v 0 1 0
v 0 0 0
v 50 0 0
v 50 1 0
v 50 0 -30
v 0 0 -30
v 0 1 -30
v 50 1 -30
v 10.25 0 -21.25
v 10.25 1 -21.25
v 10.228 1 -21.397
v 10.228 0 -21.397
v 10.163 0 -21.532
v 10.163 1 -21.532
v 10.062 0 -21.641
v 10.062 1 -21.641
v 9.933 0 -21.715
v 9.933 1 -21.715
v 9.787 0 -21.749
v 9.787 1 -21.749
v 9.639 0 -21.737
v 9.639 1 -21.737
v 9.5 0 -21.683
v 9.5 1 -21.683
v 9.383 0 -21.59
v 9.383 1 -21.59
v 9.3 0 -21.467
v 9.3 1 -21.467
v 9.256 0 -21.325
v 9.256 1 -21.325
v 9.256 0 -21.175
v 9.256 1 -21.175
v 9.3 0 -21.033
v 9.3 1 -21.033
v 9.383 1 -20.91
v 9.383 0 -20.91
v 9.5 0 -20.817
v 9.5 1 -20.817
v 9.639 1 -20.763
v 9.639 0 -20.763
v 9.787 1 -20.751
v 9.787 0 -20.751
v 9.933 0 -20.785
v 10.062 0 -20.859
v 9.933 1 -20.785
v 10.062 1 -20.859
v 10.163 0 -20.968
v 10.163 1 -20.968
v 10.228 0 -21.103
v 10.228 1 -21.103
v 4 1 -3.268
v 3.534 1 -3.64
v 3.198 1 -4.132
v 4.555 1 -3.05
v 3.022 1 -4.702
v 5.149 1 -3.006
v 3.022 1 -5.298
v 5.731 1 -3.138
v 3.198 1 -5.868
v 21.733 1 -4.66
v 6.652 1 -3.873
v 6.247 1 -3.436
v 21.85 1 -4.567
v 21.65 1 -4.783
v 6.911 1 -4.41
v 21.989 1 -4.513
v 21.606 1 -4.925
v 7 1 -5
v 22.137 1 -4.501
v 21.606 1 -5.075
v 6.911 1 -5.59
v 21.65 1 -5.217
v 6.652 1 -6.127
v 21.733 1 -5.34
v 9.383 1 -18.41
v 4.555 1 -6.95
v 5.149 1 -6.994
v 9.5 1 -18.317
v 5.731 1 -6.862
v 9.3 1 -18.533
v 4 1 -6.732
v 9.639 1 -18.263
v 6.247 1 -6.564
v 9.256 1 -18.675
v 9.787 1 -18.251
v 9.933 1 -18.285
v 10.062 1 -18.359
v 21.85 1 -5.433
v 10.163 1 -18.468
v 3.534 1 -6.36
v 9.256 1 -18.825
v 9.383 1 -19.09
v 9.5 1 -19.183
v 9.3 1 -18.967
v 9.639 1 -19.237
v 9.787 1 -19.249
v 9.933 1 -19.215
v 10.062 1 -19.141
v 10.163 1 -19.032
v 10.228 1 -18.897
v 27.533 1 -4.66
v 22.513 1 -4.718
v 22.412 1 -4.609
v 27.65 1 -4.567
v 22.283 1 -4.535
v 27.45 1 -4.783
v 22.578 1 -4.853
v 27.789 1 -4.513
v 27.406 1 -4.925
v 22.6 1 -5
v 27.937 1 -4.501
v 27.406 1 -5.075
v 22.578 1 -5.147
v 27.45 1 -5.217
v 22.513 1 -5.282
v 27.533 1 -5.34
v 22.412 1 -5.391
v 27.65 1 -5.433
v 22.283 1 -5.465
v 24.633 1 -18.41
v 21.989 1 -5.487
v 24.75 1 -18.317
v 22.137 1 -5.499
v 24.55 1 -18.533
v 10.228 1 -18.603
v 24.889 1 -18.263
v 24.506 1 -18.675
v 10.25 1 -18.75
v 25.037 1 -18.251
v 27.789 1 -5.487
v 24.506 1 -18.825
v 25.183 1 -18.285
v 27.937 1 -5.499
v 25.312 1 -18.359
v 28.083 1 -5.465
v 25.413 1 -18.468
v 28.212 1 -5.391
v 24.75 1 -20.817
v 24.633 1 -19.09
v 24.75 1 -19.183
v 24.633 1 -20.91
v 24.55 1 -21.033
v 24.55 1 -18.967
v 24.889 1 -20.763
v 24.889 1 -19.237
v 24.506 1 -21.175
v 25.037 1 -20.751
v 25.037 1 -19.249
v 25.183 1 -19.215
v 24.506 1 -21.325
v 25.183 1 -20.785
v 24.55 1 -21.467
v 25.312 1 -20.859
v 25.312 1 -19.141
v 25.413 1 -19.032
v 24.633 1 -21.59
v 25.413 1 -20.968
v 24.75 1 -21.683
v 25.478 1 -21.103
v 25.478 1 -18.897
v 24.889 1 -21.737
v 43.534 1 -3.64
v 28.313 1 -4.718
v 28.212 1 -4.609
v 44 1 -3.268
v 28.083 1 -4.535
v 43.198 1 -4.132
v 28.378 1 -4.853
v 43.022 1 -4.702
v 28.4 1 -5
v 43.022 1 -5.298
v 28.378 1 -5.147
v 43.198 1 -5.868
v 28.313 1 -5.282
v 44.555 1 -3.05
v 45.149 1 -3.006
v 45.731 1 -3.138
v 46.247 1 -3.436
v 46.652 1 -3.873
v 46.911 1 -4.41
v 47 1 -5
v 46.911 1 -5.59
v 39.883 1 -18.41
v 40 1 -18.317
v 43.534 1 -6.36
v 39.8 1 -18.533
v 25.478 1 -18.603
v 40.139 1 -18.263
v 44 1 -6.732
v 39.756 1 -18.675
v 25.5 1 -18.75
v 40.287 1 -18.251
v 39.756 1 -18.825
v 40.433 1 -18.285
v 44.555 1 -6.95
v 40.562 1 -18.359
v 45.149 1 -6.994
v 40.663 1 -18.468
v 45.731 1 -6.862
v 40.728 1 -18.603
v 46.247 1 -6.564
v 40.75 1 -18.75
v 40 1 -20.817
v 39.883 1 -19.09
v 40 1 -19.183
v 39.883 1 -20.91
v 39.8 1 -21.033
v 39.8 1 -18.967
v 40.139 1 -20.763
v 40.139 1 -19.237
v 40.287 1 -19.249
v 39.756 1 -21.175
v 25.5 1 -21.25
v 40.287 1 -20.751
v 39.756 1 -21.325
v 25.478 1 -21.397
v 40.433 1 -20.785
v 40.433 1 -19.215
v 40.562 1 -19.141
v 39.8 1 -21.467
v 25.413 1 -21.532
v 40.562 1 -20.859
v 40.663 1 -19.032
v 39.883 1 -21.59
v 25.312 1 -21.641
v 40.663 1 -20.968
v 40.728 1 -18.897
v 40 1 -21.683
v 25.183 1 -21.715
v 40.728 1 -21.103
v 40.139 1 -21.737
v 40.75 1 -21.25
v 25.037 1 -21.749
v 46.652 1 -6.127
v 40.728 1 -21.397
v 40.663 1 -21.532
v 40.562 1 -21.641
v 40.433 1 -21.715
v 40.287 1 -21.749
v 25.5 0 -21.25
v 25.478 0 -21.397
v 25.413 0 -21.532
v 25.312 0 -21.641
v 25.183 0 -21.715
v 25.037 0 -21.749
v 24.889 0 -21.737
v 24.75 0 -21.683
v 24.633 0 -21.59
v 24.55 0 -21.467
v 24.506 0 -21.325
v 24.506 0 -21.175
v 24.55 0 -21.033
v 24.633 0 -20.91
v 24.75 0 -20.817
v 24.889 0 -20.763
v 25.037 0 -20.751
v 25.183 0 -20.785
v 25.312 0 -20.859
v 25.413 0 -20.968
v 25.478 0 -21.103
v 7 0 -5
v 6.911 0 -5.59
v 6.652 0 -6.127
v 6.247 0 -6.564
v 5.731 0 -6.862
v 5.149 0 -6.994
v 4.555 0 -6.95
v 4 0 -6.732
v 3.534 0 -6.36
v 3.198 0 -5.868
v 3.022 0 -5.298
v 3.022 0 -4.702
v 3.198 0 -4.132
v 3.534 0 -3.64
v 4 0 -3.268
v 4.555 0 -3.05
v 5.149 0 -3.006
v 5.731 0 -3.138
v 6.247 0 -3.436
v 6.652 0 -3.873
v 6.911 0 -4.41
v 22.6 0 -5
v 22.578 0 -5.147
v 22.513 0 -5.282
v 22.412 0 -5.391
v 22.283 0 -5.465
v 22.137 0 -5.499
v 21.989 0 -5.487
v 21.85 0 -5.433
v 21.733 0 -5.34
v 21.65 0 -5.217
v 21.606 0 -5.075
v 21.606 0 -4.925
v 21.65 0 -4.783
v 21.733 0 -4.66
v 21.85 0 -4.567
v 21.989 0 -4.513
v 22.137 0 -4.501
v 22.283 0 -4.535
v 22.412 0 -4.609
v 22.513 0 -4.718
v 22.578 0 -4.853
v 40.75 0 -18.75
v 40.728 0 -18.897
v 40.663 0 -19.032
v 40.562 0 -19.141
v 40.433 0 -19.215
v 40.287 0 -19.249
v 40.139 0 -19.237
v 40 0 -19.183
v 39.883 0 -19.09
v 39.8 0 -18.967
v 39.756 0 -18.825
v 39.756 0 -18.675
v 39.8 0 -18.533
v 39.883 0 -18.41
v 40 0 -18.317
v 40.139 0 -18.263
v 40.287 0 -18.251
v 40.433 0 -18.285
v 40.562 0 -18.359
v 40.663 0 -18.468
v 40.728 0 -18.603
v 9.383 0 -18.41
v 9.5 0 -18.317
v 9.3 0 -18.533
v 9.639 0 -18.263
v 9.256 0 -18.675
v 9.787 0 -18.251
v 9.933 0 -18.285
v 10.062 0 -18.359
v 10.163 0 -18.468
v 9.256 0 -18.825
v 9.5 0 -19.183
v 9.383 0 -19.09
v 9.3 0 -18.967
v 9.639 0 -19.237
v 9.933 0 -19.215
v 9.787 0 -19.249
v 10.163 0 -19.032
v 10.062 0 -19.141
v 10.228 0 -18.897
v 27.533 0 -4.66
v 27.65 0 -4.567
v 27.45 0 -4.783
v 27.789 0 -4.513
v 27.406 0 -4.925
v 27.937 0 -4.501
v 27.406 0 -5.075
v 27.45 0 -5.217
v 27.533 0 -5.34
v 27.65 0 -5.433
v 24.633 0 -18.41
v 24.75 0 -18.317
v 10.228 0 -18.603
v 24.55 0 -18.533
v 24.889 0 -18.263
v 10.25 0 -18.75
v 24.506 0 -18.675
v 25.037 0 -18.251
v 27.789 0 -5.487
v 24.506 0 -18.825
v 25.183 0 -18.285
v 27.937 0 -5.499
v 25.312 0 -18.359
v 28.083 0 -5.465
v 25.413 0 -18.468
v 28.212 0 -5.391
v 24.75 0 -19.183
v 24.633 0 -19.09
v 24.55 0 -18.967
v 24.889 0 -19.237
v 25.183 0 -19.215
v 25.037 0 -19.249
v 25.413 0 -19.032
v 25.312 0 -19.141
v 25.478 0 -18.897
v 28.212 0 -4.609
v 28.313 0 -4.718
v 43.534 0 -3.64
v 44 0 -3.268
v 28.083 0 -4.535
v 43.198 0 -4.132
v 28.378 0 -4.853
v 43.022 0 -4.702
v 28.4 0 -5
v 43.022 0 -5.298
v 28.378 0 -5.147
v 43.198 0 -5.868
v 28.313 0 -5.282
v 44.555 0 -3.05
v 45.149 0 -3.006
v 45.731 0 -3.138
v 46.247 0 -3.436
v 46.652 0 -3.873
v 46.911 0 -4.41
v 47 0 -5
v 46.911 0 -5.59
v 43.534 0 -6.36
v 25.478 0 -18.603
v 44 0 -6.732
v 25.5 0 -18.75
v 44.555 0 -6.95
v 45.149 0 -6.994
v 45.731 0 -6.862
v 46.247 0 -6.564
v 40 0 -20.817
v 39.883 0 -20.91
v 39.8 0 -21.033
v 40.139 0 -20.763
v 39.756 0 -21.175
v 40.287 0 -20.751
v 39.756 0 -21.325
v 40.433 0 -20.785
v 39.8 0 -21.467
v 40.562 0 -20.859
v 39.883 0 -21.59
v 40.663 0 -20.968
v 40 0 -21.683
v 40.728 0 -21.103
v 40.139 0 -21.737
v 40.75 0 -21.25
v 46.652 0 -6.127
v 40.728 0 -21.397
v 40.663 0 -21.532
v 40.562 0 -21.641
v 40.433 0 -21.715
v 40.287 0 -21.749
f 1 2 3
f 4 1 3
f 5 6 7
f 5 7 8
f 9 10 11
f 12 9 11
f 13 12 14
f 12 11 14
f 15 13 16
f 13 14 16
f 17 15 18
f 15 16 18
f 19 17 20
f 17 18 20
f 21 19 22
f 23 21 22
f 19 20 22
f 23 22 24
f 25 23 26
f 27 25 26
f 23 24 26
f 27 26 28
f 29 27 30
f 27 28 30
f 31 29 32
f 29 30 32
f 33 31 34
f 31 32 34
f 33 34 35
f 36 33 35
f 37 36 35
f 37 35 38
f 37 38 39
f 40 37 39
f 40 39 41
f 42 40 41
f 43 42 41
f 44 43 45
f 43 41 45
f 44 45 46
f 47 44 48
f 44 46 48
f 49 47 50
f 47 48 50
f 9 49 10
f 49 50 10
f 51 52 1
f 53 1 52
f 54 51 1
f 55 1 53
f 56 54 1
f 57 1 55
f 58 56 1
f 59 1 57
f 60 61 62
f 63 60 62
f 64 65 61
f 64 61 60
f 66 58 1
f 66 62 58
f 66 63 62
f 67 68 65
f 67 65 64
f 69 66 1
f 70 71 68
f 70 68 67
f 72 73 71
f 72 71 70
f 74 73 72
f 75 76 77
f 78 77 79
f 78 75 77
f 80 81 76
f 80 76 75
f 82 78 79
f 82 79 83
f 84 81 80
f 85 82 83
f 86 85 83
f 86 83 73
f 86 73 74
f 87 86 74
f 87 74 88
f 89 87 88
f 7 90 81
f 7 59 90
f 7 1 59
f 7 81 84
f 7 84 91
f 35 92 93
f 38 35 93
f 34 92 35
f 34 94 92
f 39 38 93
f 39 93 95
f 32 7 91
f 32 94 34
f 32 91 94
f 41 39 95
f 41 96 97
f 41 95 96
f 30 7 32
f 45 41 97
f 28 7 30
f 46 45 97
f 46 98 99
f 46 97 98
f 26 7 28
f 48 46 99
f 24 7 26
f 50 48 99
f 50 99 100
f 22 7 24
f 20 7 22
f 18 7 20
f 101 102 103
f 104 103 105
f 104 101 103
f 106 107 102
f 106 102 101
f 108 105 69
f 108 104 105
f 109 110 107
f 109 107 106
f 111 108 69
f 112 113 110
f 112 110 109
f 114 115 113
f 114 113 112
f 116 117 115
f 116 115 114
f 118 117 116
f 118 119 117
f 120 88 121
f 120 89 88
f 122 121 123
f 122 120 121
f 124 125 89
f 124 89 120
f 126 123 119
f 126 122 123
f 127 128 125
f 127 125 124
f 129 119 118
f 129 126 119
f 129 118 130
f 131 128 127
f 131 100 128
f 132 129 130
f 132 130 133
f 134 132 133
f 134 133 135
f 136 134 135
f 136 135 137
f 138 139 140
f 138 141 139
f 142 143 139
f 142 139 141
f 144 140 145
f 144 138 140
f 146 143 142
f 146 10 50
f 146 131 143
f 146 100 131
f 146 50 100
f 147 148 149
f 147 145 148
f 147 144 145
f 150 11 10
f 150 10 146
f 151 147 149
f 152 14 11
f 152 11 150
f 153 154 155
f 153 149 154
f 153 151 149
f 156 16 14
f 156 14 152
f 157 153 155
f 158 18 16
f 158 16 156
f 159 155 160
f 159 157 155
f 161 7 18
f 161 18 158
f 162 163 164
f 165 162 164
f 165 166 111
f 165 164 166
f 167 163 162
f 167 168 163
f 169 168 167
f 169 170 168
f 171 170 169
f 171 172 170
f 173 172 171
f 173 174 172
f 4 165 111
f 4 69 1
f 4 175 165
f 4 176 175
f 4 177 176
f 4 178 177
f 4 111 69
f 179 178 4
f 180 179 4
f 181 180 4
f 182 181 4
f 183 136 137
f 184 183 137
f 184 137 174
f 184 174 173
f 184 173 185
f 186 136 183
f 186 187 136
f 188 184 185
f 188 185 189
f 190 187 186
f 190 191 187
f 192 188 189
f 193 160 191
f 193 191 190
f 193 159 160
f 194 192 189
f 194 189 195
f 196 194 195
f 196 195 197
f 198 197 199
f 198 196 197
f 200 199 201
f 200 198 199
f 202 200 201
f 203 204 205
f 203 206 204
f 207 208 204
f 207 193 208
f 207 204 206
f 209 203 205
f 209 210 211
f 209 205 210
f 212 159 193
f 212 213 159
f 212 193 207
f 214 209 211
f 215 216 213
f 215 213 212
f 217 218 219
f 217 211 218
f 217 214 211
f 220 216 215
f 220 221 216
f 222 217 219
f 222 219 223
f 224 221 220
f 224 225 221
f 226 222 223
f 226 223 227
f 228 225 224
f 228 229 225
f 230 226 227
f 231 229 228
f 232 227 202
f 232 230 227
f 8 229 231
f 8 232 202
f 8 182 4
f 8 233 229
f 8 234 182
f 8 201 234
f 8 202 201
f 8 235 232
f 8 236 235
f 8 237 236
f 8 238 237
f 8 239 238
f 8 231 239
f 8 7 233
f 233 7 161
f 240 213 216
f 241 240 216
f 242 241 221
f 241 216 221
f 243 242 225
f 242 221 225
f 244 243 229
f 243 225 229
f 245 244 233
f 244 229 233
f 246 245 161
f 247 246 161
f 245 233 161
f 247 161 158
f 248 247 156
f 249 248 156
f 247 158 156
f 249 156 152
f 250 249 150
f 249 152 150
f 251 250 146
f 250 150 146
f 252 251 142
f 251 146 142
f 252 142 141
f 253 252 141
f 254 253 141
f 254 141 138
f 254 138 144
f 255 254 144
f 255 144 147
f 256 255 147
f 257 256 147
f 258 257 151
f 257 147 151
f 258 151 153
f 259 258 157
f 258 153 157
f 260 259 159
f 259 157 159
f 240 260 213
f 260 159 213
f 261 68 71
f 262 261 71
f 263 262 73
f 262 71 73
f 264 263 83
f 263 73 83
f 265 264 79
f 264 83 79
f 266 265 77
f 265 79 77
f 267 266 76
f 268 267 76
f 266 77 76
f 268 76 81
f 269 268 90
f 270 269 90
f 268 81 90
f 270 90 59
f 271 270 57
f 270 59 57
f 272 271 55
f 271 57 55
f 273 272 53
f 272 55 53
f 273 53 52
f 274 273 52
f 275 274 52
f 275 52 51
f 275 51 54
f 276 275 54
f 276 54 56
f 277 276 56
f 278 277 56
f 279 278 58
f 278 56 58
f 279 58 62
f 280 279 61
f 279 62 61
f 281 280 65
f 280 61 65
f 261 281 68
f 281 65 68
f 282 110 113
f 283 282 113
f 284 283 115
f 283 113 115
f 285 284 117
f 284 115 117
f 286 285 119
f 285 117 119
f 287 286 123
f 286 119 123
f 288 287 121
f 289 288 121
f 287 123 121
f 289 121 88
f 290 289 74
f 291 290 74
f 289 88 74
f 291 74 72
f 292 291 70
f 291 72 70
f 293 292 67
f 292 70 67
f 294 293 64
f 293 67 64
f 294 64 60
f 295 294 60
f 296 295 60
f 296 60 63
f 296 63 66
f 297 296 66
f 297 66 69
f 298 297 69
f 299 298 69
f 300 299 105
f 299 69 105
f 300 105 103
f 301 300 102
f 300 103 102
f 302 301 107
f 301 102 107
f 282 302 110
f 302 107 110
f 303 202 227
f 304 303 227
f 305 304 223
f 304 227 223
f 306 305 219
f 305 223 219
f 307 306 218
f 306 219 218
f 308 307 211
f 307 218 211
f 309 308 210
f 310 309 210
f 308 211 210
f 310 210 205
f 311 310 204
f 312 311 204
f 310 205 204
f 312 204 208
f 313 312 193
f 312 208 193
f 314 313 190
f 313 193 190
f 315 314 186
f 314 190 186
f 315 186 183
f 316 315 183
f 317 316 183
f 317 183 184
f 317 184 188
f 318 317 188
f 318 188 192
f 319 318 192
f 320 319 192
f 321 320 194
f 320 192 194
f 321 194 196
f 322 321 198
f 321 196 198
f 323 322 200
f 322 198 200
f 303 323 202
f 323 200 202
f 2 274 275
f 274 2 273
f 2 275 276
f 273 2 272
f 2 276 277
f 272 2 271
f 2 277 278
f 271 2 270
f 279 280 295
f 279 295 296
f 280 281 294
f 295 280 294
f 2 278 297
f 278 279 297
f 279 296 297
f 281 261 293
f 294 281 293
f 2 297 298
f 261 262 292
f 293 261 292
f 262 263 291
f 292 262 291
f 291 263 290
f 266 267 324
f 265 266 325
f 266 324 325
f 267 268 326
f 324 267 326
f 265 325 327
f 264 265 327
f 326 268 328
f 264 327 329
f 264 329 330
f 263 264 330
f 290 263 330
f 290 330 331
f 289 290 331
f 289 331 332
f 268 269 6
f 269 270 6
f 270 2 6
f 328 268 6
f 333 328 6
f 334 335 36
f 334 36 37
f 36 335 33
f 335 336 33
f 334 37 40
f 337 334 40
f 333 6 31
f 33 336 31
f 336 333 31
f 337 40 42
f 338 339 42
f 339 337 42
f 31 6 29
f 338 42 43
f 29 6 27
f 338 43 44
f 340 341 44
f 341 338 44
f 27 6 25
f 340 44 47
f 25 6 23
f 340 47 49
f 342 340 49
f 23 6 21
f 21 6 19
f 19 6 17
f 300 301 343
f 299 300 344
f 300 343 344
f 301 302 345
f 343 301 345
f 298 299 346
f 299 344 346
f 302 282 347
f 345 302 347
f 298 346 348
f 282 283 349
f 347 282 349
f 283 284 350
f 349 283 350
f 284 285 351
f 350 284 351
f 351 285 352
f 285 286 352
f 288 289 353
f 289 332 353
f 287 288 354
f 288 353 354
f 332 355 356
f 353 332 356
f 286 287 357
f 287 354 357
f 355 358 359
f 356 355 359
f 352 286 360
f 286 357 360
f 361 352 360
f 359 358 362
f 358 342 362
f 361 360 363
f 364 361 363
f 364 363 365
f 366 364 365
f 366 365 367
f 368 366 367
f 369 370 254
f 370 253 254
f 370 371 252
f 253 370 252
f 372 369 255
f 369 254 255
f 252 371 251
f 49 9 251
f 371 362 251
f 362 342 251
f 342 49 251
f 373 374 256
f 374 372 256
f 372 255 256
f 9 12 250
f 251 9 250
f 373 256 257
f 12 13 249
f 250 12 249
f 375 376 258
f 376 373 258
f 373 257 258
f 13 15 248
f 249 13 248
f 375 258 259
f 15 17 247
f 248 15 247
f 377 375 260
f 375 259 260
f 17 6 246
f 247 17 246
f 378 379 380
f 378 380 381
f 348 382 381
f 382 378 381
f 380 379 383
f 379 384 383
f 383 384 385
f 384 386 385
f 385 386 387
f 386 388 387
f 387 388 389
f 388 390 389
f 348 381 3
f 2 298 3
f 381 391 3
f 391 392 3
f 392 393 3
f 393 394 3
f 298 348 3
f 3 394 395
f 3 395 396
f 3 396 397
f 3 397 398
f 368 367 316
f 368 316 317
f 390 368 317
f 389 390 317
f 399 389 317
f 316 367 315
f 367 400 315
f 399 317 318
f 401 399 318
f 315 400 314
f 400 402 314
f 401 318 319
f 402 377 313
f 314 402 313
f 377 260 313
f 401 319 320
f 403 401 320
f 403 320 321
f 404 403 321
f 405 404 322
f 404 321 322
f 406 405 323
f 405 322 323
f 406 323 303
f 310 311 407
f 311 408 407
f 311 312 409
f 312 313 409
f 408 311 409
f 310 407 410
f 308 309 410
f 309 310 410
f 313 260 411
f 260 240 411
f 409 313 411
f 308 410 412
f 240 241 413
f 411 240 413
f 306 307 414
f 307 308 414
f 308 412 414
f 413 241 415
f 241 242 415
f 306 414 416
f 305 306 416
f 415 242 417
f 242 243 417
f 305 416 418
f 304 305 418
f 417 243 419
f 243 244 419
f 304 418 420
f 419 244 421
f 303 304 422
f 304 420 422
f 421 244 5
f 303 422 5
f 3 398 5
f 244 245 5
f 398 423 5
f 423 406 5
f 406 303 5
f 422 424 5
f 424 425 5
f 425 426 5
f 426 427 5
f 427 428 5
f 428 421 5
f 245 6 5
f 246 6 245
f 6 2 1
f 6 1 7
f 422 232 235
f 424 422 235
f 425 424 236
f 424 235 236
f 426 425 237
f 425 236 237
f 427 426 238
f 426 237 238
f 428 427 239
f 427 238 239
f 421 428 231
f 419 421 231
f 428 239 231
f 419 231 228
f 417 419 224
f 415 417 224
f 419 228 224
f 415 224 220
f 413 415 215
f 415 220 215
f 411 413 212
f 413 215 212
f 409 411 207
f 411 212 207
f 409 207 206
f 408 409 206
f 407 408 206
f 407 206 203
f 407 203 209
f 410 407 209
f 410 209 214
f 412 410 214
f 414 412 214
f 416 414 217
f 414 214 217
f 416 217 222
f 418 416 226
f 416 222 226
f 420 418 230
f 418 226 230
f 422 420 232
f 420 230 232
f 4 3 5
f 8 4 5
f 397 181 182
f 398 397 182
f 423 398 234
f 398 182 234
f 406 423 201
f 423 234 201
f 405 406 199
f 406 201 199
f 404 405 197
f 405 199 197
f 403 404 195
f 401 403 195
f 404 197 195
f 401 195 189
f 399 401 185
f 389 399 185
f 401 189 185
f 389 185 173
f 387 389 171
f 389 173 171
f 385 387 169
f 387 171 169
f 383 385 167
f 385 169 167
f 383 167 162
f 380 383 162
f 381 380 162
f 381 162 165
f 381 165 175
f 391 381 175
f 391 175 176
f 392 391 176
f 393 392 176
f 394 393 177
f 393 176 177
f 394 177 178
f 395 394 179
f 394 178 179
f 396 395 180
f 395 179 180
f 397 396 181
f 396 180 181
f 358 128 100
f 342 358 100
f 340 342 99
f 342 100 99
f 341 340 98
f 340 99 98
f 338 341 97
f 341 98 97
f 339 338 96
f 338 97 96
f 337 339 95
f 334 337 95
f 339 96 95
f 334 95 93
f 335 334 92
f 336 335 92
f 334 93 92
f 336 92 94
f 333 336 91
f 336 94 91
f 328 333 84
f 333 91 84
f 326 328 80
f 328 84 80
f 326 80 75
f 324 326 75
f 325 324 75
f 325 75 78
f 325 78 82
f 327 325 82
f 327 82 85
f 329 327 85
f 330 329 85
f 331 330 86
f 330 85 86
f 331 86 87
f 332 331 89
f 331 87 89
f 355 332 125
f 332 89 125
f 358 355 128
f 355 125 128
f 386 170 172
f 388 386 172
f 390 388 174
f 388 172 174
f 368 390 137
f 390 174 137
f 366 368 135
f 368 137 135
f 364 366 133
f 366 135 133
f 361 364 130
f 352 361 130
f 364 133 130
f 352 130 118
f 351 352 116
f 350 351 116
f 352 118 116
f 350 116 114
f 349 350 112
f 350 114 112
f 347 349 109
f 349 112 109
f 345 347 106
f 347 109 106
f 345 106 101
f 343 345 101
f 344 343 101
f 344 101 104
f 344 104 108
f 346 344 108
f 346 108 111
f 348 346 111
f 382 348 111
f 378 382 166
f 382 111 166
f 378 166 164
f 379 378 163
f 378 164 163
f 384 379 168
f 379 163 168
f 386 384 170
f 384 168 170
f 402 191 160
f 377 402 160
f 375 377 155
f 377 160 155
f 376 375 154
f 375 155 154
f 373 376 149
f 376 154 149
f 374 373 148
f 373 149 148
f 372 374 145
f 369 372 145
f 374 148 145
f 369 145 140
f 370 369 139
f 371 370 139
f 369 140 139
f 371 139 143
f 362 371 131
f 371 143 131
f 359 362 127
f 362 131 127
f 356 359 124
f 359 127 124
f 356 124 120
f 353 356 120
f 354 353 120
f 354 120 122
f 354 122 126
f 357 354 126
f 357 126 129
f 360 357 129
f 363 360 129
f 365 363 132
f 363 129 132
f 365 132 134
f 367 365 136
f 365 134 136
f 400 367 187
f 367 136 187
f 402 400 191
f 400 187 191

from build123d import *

# Parameters (mm, degrees)
SKETCH1_W           = 50
SKETCH1_H           = 30
BOSS_EXTRUDE1_DEPTH = 1
SKETCH2_R           = 0.5
SKETCH2_R_2         = 2
CUT_EXTRUDE1_DEPTH  = 1


with BuildPart() as part:
    # Sketch1 → Boss-Extrude1 (new body)
    with BuildSketch(Plane(origin=(0, 0, 0), x_dir=(1, 0, 0), z_dir=(0, 1, 0))):
        with Locations((25, 15)):
            Rectangle(SKETCH1_W, SKETCH1_H)
    extrude(amount=BOSS_EXTRUDE1_DEPTH)

    # Sketch2 → Cut-Extrude1 (cut)
    with BuildSketch(Plane(origin=(0, 1, 0), x_dir=(1, 0, 0), z_dir=(0, 1, 0))):
        with Locations((22.1, 5)):
            Circle(SKETCH2_R)
        with Locations((27.9, 5)):
            Circle(SKETCH2_R)
        with Locations((9.75, 18.75)):
            Circle(SKETCH2_R)
        with Locations((9.75, 21.25)):
            Circle(SKETCH2_R)
        with Locations((25, 18.75)):
            Circle(SKETCH2_R)
        with Locations((25, 21.25)):
            Circle(SKETCH2_R)
        with Locations((40.25, 18.75)):
            Circle(SKETCH2_R)
        with Locations((40.25, 21.25)):
            Circle(SKETCH2_R)
        with Locations((45, 5)):
            Circle(SKETCH2_R_2)
        with Locations((5, 5)):
            Circle(SKETCH2_R_2)
    extrude(amount=-CUT_EXTRUDE1_DEPTH, mode=Mode.SUBTRACT)


solid = part.part
